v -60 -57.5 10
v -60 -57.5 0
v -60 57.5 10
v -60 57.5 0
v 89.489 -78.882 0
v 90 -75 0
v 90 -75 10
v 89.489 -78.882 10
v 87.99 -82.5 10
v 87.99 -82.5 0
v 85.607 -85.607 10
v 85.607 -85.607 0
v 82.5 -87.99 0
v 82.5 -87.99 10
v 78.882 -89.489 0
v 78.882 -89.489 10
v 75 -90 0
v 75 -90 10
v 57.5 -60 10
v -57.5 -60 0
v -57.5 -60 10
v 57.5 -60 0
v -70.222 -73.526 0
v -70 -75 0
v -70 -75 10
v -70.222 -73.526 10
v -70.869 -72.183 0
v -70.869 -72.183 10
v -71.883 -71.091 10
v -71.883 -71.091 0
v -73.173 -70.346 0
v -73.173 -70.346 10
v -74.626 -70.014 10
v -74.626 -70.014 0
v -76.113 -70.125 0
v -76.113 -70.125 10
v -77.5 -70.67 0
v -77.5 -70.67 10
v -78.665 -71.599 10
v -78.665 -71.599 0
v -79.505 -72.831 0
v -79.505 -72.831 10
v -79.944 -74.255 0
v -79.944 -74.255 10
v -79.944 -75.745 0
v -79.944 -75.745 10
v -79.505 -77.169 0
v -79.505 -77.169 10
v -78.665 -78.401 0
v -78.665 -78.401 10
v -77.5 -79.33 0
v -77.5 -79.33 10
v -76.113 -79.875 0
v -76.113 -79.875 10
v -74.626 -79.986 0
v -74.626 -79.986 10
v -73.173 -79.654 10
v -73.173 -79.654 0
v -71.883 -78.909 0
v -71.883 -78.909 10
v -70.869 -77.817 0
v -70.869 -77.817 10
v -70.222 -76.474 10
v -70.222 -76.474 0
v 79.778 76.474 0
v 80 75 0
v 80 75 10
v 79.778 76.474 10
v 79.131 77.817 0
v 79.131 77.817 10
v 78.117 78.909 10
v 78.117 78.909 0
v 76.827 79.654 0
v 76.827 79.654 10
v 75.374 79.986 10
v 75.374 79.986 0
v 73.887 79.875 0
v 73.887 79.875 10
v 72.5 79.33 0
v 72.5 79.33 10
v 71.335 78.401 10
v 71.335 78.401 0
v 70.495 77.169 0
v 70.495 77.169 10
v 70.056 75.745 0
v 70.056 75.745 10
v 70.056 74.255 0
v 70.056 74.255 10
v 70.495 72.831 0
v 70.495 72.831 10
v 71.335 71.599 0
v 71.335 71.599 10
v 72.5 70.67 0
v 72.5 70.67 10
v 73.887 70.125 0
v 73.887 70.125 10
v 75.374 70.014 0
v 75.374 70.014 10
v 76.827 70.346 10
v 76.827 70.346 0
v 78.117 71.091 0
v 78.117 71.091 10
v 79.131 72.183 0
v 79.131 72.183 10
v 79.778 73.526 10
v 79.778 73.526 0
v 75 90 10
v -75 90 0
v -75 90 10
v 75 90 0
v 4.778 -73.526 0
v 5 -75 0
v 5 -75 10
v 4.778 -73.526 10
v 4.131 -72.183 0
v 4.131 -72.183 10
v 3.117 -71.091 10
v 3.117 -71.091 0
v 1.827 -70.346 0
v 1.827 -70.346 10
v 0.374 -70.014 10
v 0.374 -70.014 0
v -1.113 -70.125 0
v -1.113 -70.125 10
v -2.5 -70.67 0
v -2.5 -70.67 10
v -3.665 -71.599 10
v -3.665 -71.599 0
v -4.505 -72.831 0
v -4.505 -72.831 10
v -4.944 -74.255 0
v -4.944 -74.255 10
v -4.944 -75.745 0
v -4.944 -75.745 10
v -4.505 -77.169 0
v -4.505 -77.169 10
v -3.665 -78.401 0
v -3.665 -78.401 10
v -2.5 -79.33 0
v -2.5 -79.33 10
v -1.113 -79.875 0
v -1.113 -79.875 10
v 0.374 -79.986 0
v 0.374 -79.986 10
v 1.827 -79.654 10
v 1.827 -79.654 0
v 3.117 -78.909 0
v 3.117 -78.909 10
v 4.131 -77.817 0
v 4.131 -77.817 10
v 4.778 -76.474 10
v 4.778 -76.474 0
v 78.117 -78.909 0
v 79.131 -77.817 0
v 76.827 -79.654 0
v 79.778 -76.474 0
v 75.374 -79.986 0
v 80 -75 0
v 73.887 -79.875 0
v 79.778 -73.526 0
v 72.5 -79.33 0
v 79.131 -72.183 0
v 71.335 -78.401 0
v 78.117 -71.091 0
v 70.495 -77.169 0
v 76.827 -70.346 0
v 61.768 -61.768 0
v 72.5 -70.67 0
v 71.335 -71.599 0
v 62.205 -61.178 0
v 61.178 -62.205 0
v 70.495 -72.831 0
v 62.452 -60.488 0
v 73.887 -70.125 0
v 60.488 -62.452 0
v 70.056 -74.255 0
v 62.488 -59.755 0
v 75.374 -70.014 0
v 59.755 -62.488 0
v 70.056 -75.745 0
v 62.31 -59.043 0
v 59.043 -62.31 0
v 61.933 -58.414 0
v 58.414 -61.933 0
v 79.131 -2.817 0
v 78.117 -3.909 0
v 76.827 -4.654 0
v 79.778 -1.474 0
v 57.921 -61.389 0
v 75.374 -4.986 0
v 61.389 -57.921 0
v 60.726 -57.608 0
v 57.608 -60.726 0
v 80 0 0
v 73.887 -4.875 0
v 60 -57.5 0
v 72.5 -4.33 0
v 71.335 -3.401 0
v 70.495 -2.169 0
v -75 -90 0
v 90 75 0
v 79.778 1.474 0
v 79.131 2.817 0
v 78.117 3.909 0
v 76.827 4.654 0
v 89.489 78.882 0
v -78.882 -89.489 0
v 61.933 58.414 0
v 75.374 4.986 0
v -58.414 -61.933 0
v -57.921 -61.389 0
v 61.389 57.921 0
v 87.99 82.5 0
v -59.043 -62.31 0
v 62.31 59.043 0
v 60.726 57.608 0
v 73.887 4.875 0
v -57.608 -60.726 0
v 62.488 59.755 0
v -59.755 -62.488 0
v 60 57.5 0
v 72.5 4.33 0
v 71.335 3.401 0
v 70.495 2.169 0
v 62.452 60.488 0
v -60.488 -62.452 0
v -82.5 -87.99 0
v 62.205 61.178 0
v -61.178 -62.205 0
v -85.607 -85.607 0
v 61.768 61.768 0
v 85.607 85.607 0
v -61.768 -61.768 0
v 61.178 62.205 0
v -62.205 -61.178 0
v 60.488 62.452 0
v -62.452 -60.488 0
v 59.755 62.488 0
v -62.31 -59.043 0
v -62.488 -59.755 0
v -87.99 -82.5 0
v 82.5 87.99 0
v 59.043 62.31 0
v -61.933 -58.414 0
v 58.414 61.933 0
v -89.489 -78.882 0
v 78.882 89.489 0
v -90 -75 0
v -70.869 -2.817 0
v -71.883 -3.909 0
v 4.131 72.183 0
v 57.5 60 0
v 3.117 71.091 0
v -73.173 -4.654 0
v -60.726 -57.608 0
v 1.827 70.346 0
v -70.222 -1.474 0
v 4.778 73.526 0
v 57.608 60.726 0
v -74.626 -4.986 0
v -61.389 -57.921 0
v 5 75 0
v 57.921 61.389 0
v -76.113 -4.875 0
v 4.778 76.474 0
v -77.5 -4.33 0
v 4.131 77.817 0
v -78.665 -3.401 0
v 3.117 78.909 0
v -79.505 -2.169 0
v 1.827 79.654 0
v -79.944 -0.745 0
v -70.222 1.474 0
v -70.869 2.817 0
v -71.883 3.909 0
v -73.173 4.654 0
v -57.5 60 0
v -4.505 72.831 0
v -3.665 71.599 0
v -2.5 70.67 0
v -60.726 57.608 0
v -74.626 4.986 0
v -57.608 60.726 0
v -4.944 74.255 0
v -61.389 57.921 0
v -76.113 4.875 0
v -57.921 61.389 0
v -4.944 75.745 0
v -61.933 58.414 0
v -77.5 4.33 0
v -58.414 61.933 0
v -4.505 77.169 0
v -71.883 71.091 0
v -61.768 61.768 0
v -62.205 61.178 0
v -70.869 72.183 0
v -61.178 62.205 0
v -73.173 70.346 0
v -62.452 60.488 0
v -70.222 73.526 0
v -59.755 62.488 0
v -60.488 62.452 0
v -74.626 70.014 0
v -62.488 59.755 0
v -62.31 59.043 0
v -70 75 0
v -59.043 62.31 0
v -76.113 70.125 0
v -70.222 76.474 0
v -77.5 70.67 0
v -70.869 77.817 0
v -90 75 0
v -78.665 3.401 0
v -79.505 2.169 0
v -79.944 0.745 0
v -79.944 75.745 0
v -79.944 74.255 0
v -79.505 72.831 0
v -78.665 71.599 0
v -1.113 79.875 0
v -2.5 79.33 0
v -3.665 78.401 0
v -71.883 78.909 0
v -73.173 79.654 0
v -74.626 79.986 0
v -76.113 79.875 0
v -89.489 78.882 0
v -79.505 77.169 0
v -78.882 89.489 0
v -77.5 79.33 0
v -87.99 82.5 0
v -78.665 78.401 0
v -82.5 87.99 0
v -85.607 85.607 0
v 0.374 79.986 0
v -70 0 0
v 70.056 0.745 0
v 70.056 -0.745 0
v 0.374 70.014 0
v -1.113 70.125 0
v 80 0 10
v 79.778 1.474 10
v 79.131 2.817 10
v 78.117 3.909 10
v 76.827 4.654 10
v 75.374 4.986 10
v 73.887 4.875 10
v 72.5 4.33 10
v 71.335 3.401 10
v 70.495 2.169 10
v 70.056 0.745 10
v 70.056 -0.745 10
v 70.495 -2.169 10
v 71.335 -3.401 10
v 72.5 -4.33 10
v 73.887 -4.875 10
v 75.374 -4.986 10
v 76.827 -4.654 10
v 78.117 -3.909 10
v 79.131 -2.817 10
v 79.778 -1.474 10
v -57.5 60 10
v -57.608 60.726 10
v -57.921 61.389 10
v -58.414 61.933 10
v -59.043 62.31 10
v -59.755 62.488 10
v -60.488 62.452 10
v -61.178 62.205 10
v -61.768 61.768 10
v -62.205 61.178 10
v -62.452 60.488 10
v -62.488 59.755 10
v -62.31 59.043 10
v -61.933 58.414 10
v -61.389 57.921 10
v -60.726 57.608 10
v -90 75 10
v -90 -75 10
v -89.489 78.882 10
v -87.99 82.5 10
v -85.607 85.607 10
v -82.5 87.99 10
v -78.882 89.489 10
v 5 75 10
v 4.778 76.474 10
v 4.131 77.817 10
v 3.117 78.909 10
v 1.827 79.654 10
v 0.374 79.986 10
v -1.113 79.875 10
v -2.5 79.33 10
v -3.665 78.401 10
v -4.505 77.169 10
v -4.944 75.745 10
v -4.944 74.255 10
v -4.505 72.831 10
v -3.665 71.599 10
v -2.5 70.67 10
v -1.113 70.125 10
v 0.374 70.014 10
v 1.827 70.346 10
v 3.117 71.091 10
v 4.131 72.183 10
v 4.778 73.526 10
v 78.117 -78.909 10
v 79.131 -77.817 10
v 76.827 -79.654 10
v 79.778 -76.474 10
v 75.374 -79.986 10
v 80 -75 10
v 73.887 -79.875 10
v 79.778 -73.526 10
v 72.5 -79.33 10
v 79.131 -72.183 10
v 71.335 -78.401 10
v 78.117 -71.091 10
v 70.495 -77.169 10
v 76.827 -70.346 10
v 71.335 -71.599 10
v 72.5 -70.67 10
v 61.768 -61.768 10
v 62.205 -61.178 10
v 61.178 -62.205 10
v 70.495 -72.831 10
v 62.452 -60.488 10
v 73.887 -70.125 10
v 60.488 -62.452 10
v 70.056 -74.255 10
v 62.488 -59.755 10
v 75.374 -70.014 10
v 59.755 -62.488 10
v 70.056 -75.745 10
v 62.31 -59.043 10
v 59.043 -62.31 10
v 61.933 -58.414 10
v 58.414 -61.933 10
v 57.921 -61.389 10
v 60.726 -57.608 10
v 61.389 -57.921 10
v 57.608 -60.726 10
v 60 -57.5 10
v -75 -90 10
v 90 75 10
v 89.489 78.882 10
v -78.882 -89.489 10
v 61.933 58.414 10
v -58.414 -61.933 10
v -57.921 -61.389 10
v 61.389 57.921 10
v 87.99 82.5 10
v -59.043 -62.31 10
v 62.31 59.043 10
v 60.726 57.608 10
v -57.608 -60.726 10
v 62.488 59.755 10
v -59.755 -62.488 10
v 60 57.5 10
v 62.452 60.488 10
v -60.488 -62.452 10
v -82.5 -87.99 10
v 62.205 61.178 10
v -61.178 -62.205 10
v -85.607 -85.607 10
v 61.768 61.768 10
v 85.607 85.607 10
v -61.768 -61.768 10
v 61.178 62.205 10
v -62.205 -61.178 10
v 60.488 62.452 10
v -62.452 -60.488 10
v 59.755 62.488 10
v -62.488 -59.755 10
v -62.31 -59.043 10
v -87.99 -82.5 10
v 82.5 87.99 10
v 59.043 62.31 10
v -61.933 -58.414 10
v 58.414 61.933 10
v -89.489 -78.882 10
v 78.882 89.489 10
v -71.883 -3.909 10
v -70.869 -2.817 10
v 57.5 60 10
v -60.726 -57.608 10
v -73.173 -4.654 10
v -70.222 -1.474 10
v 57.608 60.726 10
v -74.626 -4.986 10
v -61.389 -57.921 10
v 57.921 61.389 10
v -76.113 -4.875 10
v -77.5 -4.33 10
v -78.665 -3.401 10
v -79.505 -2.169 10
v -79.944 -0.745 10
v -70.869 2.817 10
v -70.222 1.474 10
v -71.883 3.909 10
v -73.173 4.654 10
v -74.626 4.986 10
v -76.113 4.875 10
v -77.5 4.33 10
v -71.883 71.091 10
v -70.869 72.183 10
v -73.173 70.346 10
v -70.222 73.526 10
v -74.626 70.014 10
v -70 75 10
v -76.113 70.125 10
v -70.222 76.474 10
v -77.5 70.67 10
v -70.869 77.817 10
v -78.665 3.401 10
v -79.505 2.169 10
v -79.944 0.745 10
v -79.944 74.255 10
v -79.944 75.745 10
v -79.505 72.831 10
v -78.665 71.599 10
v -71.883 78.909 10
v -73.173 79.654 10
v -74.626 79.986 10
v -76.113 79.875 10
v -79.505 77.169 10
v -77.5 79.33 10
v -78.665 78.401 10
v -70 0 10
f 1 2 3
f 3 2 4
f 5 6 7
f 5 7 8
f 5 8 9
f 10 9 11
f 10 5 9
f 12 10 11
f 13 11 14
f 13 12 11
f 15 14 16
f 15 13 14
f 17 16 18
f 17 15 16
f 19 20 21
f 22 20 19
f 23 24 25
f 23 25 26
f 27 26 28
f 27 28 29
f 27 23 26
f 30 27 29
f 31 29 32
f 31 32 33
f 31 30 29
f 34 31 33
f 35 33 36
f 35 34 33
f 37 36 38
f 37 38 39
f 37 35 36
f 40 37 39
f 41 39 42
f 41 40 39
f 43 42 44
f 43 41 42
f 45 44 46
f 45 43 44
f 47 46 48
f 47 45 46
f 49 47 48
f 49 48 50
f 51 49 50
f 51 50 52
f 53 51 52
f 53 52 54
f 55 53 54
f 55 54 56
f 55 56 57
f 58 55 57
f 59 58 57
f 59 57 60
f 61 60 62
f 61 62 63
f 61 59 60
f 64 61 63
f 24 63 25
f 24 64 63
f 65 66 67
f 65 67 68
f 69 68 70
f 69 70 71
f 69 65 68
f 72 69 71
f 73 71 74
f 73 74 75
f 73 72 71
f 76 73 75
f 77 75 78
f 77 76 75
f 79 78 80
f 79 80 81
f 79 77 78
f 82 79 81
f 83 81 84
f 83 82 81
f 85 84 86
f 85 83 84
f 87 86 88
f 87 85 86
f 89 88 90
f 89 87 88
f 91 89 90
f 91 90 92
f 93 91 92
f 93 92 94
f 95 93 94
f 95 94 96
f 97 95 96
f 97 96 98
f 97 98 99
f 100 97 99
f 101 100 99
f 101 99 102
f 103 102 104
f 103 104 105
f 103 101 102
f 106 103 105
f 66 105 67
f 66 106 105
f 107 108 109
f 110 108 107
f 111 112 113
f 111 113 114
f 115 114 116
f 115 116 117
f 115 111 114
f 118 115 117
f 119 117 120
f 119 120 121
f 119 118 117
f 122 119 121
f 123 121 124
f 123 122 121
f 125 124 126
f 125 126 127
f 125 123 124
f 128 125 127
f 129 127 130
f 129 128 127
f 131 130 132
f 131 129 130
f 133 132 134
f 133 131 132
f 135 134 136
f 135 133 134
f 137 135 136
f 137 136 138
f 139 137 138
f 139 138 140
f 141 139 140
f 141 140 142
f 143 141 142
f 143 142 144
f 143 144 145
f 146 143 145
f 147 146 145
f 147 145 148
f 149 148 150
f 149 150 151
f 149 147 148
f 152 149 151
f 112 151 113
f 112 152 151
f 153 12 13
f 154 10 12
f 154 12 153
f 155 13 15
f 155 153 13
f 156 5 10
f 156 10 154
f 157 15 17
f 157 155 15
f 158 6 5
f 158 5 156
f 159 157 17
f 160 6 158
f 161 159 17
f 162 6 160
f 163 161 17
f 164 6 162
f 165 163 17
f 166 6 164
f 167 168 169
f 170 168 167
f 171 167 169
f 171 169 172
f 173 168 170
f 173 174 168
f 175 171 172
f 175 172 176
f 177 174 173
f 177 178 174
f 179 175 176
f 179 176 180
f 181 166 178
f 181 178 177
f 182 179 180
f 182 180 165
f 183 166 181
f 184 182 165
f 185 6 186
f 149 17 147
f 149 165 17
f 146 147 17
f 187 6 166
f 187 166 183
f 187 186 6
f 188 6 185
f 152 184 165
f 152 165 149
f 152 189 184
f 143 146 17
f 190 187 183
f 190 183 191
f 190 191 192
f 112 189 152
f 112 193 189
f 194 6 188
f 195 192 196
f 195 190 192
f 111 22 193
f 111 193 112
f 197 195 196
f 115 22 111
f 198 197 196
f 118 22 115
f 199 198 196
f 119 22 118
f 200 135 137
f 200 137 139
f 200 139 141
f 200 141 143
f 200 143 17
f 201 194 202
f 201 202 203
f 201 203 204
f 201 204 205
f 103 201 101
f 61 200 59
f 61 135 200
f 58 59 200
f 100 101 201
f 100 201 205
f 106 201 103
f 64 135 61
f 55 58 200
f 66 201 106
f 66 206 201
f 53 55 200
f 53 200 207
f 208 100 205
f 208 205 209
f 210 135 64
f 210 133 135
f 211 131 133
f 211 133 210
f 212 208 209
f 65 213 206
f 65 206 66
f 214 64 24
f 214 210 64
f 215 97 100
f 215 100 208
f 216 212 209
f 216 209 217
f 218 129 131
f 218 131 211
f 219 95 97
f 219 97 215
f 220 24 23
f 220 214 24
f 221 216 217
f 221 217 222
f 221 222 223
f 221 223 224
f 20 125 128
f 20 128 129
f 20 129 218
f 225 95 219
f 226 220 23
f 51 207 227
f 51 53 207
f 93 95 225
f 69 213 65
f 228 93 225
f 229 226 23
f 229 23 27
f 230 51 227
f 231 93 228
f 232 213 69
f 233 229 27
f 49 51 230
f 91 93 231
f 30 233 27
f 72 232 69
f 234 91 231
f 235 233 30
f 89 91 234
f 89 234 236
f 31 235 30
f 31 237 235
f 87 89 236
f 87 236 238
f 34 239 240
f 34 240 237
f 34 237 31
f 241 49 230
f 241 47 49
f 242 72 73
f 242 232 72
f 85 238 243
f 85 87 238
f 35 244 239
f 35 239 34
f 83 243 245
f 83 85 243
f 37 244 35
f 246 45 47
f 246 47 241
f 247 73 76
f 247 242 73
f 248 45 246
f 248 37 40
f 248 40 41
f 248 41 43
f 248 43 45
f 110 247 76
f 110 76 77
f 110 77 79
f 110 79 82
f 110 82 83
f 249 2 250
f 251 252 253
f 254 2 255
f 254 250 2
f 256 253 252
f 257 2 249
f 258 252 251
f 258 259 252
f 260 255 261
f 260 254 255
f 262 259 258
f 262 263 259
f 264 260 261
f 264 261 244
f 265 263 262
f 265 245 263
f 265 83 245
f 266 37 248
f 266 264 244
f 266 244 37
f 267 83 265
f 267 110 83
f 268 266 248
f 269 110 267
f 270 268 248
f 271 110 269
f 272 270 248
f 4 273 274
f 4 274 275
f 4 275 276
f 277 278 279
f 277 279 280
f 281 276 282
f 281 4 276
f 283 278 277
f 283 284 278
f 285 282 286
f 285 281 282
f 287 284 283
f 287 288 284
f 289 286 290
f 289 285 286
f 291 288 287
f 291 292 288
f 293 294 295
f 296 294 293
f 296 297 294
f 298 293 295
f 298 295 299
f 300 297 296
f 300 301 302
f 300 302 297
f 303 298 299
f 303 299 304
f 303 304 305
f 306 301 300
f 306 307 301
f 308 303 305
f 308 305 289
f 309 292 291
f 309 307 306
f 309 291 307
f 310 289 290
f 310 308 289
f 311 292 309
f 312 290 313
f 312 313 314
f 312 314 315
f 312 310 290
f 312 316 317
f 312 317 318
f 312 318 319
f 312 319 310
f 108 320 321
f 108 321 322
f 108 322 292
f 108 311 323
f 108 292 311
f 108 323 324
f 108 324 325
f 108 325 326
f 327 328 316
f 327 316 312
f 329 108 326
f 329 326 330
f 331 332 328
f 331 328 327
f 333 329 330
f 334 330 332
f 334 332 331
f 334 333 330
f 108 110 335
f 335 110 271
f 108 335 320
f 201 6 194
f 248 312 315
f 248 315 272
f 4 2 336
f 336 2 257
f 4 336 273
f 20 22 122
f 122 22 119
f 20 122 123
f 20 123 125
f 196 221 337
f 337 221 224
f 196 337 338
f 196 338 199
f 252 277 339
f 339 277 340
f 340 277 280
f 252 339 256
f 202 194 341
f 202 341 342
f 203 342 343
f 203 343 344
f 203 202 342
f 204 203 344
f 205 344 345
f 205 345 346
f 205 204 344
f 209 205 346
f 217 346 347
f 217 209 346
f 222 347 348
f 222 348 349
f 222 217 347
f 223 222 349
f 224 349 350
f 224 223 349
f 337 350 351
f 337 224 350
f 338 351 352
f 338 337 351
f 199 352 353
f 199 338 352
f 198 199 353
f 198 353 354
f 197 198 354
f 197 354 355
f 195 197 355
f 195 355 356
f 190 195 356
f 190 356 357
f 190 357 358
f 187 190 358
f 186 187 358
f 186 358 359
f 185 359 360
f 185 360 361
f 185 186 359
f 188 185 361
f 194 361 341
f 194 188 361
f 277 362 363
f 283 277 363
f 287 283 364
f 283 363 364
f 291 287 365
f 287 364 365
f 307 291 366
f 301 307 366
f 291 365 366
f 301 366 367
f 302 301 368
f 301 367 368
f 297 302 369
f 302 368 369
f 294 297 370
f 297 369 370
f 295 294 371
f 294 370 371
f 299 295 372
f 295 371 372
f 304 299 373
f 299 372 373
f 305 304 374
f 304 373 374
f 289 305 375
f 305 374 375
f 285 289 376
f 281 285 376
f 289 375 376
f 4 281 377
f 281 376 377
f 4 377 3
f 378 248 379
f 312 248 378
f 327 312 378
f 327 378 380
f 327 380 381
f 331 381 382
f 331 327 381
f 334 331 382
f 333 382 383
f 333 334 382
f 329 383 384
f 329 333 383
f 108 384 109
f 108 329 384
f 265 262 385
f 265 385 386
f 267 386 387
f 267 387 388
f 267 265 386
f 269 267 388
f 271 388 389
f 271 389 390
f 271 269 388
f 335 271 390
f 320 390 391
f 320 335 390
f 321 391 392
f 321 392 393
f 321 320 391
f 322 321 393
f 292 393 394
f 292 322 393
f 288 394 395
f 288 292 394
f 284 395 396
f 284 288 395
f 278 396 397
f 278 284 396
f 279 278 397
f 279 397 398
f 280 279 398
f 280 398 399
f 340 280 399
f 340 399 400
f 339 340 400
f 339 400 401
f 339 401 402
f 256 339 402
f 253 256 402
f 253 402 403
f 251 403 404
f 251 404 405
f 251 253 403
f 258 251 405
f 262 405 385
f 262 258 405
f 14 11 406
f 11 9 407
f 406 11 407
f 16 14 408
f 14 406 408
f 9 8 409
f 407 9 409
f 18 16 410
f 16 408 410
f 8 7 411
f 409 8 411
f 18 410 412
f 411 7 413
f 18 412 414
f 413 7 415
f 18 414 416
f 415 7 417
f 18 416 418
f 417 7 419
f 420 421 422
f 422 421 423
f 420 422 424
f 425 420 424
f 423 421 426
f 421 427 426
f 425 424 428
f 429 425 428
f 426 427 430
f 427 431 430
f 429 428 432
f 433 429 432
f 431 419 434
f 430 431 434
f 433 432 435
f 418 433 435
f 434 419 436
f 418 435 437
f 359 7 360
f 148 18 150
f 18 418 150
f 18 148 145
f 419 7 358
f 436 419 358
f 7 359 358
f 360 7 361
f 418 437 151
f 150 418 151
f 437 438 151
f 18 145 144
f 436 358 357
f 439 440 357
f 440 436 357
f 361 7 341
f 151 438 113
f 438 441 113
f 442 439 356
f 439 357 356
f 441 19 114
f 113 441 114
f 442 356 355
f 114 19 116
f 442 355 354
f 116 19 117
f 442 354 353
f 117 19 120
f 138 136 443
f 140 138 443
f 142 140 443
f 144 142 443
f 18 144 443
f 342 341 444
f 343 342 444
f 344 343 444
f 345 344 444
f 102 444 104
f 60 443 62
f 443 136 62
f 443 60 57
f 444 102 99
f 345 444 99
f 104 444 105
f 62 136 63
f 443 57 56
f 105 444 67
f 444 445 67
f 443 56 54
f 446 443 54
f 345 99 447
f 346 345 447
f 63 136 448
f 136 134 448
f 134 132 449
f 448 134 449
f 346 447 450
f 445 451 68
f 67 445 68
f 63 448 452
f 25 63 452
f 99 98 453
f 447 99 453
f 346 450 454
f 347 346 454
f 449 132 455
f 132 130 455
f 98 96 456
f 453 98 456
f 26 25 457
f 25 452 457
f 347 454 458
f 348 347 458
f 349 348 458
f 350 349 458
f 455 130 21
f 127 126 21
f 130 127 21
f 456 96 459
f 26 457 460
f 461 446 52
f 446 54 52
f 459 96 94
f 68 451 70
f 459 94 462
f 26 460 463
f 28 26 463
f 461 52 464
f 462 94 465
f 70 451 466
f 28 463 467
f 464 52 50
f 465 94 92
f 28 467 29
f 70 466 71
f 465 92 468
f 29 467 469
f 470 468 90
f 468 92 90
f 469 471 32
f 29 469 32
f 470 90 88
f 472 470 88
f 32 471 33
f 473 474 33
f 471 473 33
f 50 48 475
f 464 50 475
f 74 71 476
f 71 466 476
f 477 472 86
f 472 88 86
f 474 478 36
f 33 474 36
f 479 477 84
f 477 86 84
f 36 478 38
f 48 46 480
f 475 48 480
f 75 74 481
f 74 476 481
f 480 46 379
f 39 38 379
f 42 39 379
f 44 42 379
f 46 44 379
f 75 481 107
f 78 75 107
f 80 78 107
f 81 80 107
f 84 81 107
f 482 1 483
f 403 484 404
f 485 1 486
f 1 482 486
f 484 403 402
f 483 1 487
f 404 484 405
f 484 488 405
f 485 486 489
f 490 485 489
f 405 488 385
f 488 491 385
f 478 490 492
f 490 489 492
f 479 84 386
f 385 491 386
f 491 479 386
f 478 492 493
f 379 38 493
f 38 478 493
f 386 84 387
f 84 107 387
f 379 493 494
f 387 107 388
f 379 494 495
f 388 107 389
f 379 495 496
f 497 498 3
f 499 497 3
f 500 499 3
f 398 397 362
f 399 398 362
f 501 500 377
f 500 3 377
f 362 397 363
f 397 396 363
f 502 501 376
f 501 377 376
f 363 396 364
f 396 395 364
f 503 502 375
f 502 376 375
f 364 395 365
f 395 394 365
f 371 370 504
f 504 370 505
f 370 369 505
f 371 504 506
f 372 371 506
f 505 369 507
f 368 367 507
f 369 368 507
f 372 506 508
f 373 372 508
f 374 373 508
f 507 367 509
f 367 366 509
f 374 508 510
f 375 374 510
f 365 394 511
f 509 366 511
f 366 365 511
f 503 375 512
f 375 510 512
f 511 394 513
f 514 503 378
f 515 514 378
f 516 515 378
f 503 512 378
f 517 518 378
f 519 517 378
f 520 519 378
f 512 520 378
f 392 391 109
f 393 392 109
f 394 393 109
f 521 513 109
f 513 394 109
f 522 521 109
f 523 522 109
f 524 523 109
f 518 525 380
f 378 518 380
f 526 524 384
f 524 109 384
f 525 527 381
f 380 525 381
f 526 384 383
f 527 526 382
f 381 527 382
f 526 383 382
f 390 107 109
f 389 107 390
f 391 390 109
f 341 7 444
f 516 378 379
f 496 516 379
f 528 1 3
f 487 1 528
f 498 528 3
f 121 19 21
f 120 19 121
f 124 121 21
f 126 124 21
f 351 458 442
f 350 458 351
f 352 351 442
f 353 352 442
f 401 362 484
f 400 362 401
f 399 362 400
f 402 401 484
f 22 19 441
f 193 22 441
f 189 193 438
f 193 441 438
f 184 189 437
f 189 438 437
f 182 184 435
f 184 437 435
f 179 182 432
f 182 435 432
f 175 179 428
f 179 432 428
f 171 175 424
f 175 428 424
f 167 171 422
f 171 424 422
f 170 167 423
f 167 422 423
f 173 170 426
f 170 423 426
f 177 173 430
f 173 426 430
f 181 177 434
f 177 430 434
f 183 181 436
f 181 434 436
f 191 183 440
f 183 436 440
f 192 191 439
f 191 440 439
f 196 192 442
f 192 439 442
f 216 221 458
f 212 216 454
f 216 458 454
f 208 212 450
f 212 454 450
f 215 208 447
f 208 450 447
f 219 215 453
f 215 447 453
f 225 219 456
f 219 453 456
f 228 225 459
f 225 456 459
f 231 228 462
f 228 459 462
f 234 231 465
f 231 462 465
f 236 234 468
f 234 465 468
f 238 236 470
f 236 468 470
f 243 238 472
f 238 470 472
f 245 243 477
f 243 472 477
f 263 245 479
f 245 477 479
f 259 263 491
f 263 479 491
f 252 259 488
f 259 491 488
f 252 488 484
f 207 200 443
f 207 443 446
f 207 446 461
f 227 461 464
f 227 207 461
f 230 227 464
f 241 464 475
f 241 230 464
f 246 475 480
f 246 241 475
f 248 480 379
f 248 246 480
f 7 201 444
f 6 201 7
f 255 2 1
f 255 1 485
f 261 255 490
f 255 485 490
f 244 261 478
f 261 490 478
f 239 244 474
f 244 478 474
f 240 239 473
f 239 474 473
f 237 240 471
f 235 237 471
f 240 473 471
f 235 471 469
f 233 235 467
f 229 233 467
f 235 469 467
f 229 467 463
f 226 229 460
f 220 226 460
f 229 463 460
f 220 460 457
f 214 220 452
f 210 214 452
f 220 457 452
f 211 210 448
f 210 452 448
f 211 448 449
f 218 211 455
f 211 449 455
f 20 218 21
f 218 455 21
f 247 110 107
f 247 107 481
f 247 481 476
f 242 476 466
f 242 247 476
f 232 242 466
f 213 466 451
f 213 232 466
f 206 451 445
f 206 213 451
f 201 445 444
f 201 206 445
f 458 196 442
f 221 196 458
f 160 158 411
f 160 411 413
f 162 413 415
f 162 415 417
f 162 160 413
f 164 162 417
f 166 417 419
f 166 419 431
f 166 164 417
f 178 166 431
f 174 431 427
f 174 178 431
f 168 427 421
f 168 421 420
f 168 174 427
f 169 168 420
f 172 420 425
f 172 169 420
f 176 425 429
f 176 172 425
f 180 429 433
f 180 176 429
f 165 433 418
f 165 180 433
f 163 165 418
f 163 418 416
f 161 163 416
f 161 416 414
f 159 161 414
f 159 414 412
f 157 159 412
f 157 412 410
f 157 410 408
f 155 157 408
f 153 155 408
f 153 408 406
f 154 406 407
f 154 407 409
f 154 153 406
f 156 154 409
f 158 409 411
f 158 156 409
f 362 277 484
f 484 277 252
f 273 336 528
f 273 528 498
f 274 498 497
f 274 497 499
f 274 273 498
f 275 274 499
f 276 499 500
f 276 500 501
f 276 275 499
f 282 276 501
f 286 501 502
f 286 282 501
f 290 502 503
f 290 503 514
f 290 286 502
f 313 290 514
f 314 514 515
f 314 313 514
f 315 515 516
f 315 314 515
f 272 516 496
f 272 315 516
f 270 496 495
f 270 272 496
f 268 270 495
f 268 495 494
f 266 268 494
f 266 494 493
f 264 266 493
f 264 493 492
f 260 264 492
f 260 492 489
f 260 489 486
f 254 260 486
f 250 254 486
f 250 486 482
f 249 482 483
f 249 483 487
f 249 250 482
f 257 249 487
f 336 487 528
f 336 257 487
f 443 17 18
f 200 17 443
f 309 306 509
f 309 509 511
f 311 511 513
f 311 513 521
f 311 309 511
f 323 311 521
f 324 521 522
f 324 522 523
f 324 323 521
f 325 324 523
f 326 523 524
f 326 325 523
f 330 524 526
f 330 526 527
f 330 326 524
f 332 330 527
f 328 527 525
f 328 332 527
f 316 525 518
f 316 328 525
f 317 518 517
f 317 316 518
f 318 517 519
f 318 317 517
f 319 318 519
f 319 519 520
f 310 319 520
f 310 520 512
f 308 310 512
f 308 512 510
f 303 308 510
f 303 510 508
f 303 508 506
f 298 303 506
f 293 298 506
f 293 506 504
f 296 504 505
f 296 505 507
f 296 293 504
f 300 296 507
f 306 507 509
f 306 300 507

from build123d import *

# Parameters (mm, degrees)
SKETCH2_R           = 5
SKETCH2_W           = 120
SKETCH2_H           = 120
BOSS_EXTRUDE1_DEPTH = 10
SKETCH3_R           = 2.5
CUT_EXTRUDE1_DEPTH  = 10


with BuildPart() as part:
    # Sketch2 → Boss-Extrude1 (new body)
    with BuildSketch(Plane.XY):
        with BuildLine():
            Line((-75, 90), (75, 90))
            ThreePointArc((75, 90), (85.606601718, 85.606601718), (90, 75))
            Line((90, 75), (90, -75))
            ThreePointArc((90, -75), (85.606601718, -85.606601718), (75, -90))
            Line((75, -90), (-75, -90))
            ThreePointArc((-75, -90), (-85.606601718, -85.606601718), (-90, -75))
            Line((-90, -75), (-90, 75))
            ThreePointArc((-90, 75), (-85.606601718, 85.606601718), (-75, 90))
        make_face()
        with Locations((-75, 75)):
            Circle(SKETCH2_R, mode=Mode.SUBTRACT)
        with Locations((0, 75)):
            Circle(SKETCH2_R, mode=Mode.SUBTRACT)
        with Locations((75, 75)):
            Circle(SKETCH2_R, mode=Mode.SUBTRACT)
        with Locations((-75, 0)):
            Circle(SKETCH2_R, mode=Mode.SUBTRACT)
        with Locations((75, 0)):
            Circle(SKETCH2_R, mode=Mode.SUBTRACT)
        with Locations((-75, -75)):
            Circle(SKETCH2_R, mode=Mode.SUBTRACT)
        with Locations((0, -75)):
            Circle(SKETCH2_R, mode=Mode.SUBTRACT)
        with Locations((75, -75)):
            Circle(SKETCH2_R, mode=Mode.SUBTRACT)
        Rectangle(SKETCH2_W, SKETCH2_H, mode=Mode.SUBTRACT)
    extrude(amount=BOSS_EXTRUDE1_DEPTH)

    # Sketch3 → Cut-Extrude1 (cut)
    with BuildSketch(Plane.XY.offset(10)):
        with Locations((-60, 60)):
            Circle(SKETCH3_R)
        with Locations((60, 60)):
            Circle(SKETCH3_R)
        with Locations((60, -60)):
            Circle(SKETCH3_R)
        with Locations((-60, -60)):
            Circle(SKETCH3_R)
    extrude(amount=-CUT_EXTRUDE1_DEPTH, mode=Mode.SUBTRACT)


solid = part.part
